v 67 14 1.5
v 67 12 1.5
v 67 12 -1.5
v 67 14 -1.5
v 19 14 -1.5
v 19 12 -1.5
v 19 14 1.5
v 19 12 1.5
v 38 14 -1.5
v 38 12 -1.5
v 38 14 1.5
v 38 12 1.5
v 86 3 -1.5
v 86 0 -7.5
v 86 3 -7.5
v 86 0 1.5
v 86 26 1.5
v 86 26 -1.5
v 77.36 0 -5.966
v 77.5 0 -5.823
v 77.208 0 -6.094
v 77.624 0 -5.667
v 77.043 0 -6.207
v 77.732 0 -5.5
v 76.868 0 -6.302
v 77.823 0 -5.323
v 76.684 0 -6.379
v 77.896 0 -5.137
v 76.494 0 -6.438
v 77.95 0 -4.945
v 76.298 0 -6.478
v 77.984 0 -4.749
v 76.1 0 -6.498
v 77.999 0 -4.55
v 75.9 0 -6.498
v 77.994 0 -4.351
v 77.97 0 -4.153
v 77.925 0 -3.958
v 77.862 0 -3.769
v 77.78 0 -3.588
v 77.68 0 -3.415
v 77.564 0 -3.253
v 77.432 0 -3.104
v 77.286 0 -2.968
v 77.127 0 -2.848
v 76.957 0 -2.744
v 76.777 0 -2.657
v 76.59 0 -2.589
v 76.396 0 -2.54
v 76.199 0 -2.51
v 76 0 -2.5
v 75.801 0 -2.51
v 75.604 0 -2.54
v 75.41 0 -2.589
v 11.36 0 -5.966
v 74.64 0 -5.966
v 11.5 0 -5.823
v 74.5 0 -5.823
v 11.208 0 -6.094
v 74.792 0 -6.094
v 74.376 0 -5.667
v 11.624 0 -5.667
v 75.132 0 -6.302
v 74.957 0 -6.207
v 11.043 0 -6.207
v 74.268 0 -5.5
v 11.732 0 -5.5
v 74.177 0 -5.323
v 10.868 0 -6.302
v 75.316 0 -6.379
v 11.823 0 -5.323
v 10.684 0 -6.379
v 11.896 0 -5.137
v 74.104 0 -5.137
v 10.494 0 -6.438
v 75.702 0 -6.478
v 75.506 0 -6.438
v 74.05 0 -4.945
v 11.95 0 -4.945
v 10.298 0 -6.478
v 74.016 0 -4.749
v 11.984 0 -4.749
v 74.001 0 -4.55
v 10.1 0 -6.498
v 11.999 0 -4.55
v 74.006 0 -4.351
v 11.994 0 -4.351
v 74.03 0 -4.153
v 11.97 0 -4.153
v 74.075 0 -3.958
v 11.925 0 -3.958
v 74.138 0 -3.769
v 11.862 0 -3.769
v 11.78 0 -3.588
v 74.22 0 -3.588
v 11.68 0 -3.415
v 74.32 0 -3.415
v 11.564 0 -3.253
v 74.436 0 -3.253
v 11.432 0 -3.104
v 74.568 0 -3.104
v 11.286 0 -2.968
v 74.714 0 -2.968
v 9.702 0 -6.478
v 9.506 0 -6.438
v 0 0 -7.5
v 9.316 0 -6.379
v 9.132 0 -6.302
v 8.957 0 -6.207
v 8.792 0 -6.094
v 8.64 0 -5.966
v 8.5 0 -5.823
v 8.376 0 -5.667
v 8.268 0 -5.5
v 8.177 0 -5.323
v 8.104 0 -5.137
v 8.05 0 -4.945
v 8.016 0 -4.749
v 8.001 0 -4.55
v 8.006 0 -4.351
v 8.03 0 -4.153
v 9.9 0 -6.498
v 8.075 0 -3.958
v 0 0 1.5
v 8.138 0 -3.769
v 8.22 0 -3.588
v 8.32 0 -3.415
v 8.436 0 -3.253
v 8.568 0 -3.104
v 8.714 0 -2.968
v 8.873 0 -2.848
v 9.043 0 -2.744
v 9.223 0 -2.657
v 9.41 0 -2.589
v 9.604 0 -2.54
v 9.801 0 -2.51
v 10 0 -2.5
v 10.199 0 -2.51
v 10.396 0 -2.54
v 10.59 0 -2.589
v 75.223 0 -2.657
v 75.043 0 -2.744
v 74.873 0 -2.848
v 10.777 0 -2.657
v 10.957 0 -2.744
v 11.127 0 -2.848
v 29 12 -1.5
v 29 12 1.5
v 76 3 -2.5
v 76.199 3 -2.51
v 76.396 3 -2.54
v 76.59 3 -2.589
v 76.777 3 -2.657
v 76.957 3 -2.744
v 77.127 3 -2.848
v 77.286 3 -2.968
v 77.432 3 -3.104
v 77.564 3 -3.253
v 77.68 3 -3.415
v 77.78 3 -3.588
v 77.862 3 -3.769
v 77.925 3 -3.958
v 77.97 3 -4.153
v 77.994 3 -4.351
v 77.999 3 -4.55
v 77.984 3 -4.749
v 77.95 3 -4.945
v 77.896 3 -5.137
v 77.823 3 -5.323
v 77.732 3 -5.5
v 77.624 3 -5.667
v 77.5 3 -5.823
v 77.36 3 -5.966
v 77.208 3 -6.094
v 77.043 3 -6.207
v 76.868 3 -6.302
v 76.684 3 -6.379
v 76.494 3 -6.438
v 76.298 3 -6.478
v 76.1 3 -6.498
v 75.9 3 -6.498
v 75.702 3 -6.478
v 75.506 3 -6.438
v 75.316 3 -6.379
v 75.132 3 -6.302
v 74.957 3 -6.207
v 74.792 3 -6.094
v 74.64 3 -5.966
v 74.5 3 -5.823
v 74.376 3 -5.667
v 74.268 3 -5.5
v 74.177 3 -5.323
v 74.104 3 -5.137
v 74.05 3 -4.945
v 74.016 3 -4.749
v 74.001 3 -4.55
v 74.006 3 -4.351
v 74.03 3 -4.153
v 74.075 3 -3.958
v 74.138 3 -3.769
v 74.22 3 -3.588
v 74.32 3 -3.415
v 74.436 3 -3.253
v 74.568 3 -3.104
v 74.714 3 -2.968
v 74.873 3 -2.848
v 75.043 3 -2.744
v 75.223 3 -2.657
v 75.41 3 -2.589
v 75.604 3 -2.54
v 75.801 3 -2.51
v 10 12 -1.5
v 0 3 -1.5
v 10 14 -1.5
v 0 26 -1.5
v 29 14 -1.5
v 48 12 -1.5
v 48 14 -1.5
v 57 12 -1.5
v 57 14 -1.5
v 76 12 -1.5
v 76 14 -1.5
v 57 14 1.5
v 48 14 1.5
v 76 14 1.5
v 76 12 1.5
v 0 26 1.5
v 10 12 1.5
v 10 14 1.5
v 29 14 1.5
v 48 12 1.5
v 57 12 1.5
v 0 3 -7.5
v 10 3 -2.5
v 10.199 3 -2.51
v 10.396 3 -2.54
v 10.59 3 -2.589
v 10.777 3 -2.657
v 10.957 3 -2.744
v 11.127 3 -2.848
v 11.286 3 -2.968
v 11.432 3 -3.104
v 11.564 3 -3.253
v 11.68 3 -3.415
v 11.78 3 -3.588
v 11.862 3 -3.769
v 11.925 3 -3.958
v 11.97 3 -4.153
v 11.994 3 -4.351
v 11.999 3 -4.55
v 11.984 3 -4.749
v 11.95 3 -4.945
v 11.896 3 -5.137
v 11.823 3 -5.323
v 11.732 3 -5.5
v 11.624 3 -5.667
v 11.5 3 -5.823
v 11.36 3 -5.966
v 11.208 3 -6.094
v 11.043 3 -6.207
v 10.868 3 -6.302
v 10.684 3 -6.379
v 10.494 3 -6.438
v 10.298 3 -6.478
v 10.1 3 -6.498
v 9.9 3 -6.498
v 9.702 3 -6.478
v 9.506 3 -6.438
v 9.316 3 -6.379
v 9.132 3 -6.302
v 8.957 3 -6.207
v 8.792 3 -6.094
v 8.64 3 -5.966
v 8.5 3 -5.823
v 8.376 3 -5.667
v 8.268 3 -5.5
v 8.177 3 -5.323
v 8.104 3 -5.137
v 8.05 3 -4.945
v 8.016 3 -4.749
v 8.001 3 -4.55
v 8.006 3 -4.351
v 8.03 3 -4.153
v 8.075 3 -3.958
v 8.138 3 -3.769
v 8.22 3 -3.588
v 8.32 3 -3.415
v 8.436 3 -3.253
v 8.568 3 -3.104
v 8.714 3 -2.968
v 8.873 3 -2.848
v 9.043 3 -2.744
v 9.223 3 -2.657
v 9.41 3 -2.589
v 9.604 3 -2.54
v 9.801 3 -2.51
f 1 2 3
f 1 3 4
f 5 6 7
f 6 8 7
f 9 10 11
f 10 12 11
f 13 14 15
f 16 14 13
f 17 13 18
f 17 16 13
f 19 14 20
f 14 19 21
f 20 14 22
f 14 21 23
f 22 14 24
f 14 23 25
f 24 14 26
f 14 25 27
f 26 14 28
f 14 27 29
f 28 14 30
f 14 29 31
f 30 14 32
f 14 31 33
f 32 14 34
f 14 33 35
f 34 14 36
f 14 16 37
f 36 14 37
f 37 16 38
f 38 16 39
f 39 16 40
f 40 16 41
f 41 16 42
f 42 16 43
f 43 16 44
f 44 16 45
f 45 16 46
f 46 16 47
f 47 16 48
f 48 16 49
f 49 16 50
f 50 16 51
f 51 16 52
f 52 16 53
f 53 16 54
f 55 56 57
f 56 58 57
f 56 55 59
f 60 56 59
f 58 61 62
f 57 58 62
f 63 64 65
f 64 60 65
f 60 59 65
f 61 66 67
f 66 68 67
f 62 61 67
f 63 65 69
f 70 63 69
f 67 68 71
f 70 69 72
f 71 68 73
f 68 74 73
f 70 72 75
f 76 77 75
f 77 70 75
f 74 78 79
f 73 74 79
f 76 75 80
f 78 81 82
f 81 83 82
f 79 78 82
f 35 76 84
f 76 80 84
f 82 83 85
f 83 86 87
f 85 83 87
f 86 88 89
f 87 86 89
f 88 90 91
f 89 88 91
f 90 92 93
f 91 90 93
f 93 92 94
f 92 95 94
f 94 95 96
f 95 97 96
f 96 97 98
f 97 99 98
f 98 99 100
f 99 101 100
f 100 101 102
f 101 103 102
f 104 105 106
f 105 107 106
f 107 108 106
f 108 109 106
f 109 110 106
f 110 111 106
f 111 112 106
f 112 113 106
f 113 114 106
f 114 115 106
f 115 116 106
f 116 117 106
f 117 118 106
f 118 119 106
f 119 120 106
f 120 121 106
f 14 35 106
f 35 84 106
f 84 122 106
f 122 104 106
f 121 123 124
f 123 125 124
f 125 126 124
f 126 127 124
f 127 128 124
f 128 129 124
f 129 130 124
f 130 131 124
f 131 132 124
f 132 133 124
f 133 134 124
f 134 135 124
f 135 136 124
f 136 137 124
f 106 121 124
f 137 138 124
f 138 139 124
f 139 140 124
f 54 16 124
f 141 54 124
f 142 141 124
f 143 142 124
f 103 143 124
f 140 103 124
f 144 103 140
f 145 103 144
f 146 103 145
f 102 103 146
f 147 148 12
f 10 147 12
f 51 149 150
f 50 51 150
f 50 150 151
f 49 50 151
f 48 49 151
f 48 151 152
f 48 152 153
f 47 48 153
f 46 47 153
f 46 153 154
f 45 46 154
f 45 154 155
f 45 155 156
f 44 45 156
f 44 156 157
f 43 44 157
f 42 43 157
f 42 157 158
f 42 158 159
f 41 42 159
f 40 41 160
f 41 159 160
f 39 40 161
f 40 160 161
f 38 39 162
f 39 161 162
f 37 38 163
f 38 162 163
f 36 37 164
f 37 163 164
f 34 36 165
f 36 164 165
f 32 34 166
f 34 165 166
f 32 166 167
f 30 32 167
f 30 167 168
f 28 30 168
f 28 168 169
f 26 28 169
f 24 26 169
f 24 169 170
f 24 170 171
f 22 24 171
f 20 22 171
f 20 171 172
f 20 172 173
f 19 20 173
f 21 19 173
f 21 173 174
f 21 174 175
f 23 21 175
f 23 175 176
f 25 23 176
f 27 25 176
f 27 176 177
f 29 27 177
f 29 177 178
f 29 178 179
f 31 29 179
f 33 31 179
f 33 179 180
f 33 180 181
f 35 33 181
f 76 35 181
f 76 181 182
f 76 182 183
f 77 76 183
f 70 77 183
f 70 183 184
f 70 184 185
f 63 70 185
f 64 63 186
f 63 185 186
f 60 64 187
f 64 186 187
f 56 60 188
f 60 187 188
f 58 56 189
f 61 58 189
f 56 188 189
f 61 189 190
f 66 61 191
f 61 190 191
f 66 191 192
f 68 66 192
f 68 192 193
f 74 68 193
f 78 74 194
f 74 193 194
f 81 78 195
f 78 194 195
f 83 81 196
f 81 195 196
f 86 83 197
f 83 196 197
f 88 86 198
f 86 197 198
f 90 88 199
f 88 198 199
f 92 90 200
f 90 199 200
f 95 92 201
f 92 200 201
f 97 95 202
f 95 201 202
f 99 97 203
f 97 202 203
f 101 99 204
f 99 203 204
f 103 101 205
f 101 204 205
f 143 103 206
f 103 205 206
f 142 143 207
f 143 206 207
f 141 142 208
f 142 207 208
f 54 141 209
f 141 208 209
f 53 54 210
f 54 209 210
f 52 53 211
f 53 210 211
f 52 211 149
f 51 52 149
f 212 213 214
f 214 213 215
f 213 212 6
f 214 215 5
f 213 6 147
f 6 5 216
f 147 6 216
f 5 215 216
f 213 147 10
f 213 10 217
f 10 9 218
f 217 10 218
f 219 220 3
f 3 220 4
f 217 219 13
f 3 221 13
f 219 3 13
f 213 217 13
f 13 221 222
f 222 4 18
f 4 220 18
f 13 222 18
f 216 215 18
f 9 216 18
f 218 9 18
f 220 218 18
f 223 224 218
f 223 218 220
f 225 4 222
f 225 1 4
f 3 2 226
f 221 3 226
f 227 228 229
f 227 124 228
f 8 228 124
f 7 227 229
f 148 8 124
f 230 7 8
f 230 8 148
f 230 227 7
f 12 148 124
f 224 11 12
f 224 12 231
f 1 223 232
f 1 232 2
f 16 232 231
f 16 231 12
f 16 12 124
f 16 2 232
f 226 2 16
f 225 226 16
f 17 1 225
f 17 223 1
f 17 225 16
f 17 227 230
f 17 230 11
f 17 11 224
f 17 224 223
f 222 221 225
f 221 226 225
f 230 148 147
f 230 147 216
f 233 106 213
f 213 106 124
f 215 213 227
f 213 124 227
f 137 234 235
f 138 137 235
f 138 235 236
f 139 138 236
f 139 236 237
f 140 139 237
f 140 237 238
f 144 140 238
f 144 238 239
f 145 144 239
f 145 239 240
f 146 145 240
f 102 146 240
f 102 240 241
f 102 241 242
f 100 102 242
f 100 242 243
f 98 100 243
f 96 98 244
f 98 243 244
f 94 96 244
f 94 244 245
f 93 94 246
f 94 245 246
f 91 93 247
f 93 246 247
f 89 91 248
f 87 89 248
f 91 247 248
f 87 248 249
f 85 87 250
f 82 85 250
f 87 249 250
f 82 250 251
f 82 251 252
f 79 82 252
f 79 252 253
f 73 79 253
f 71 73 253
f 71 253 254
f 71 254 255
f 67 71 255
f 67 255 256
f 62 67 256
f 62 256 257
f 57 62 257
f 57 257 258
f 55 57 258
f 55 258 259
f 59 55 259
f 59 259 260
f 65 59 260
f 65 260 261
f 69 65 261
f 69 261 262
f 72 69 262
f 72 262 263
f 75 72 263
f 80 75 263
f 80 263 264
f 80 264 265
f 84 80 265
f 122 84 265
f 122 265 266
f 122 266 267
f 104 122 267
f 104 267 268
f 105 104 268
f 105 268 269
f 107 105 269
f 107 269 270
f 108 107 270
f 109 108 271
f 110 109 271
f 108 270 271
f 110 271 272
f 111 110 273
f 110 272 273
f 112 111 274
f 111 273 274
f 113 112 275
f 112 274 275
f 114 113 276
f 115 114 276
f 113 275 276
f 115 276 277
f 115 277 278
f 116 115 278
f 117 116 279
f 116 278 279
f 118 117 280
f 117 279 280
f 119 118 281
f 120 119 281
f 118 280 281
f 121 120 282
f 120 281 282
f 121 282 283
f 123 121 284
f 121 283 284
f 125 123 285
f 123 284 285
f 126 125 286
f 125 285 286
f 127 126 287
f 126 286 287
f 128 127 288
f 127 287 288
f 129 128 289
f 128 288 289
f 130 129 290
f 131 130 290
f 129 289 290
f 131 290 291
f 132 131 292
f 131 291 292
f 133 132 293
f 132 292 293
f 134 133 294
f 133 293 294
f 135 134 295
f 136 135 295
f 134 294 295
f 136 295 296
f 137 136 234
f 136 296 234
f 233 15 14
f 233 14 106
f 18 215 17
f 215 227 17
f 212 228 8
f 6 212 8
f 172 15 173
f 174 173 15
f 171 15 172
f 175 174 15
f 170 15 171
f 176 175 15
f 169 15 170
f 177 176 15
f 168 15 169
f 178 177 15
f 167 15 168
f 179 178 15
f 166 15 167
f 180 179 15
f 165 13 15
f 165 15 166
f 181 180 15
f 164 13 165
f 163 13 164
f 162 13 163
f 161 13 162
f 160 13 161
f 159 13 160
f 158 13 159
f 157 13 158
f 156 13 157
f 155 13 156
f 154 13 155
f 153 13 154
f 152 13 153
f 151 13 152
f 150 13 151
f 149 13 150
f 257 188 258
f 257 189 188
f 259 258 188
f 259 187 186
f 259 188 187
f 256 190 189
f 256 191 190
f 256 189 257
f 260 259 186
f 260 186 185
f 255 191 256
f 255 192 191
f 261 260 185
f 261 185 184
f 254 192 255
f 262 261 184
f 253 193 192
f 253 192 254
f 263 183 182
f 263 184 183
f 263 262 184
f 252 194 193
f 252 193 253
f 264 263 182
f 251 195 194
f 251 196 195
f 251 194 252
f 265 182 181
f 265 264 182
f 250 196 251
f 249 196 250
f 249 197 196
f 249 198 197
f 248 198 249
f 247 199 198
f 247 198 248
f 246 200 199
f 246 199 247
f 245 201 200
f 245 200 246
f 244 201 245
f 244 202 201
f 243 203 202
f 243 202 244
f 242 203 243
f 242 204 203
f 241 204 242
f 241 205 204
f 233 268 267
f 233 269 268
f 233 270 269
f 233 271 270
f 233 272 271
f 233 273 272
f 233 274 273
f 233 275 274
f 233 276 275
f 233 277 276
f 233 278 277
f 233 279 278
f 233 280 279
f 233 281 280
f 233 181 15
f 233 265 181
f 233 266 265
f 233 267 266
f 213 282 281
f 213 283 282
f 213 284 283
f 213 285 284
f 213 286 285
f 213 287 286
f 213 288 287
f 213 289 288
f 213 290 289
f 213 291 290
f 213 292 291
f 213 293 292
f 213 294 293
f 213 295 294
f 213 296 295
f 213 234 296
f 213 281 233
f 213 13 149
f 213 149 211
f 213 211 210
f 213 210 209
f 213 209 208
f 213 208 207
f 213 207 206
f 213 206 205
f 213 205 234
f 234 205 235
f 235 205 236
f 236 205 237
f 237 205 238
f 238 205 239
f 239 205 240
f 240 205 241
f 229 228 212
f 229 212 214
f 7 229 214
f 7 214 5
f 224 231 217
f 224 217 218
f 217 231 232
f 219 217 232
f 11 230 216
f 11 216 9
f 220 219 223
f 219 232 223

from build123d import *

# Parameters (mm, degrees)
SKETCH_1_W          = 86
SKETCH_1_H          = 26
SKETCH_1_W_2        = 9
SKETCH_1_H_2        = 2
EXTRUDE_1_DEPTH     = 1.5
SKETCH_3_W          = 86
SKETCH_3_H          = 3
EXTRUDE_2_DEPTH     = 6
SKETCH_4_R          = 2
CUT_EXTRUDE_1_DEPTH = 6


with BuildPart() as part:
    # 草图1 → 凸台-拉伸1 (new, symmetric)
    with BuildSketch(Plane.XY):
        with Locations((43, 13)):
            Rectangle(SKETCH_1_W, SKETCH_1_H)
        with Locations((14.5, 13)):
            Rectangle(SKETCH_1_W_2, SKETCH_1_H_2, mode=Mode.SUBTRACT)
        with Locations((33.5, 13)):
            Rectangle(SKETCH_1_W_2, SKETCH_1_H_2, mode=Mode.SUBTRACT)
        with Locations((52.5, 13)):
            Rectangle(SKETCH_1_W_2, SKETCH_1_H_2, mode=Mode.SUBTRACT)
        with Locations((71.5, 13)):
            Rectangle(SKETCH_1_W_2, SKETCH_1_H_2, mode=Mode.SUBTRACT)
    extrude(amount=EXTRUDE_1_DEPTH, both=True)

    # 草图3 → 凸台-拉伸2 (add)
    with BuildSketch(Plane(origin=(0, 0, -1.5), x_dir=(-1, 0, 0), z_dir=(0, 0, -1))):
        with Locations((-43, 1.5)):
            Rectangle(SKETCH_3_W, SKETCH_3_H)
    extrude(amount=EXTRUDE_2_DEPTH)

    # 草图4 → 切除-拉伸1 (cut)
    with BuildSketch(Plane(origin=(0, 3, 0), x_dir=(1, 0, 0), z_dir=(0, 1, 0))):
        with Locations(Location((10, 4.5, 0), (0, 0, 270))):
            Circle(SKETCH_4_R)
        with Locations(Location((76, 4.5, 0), (0, 0, 270))):
            Circle(SKETCH_4_R)
    extrude(amount=-CUT_EXTRUDE_1_DEPTH, mode=Mode.SUBTRACT)


solid = part.part
